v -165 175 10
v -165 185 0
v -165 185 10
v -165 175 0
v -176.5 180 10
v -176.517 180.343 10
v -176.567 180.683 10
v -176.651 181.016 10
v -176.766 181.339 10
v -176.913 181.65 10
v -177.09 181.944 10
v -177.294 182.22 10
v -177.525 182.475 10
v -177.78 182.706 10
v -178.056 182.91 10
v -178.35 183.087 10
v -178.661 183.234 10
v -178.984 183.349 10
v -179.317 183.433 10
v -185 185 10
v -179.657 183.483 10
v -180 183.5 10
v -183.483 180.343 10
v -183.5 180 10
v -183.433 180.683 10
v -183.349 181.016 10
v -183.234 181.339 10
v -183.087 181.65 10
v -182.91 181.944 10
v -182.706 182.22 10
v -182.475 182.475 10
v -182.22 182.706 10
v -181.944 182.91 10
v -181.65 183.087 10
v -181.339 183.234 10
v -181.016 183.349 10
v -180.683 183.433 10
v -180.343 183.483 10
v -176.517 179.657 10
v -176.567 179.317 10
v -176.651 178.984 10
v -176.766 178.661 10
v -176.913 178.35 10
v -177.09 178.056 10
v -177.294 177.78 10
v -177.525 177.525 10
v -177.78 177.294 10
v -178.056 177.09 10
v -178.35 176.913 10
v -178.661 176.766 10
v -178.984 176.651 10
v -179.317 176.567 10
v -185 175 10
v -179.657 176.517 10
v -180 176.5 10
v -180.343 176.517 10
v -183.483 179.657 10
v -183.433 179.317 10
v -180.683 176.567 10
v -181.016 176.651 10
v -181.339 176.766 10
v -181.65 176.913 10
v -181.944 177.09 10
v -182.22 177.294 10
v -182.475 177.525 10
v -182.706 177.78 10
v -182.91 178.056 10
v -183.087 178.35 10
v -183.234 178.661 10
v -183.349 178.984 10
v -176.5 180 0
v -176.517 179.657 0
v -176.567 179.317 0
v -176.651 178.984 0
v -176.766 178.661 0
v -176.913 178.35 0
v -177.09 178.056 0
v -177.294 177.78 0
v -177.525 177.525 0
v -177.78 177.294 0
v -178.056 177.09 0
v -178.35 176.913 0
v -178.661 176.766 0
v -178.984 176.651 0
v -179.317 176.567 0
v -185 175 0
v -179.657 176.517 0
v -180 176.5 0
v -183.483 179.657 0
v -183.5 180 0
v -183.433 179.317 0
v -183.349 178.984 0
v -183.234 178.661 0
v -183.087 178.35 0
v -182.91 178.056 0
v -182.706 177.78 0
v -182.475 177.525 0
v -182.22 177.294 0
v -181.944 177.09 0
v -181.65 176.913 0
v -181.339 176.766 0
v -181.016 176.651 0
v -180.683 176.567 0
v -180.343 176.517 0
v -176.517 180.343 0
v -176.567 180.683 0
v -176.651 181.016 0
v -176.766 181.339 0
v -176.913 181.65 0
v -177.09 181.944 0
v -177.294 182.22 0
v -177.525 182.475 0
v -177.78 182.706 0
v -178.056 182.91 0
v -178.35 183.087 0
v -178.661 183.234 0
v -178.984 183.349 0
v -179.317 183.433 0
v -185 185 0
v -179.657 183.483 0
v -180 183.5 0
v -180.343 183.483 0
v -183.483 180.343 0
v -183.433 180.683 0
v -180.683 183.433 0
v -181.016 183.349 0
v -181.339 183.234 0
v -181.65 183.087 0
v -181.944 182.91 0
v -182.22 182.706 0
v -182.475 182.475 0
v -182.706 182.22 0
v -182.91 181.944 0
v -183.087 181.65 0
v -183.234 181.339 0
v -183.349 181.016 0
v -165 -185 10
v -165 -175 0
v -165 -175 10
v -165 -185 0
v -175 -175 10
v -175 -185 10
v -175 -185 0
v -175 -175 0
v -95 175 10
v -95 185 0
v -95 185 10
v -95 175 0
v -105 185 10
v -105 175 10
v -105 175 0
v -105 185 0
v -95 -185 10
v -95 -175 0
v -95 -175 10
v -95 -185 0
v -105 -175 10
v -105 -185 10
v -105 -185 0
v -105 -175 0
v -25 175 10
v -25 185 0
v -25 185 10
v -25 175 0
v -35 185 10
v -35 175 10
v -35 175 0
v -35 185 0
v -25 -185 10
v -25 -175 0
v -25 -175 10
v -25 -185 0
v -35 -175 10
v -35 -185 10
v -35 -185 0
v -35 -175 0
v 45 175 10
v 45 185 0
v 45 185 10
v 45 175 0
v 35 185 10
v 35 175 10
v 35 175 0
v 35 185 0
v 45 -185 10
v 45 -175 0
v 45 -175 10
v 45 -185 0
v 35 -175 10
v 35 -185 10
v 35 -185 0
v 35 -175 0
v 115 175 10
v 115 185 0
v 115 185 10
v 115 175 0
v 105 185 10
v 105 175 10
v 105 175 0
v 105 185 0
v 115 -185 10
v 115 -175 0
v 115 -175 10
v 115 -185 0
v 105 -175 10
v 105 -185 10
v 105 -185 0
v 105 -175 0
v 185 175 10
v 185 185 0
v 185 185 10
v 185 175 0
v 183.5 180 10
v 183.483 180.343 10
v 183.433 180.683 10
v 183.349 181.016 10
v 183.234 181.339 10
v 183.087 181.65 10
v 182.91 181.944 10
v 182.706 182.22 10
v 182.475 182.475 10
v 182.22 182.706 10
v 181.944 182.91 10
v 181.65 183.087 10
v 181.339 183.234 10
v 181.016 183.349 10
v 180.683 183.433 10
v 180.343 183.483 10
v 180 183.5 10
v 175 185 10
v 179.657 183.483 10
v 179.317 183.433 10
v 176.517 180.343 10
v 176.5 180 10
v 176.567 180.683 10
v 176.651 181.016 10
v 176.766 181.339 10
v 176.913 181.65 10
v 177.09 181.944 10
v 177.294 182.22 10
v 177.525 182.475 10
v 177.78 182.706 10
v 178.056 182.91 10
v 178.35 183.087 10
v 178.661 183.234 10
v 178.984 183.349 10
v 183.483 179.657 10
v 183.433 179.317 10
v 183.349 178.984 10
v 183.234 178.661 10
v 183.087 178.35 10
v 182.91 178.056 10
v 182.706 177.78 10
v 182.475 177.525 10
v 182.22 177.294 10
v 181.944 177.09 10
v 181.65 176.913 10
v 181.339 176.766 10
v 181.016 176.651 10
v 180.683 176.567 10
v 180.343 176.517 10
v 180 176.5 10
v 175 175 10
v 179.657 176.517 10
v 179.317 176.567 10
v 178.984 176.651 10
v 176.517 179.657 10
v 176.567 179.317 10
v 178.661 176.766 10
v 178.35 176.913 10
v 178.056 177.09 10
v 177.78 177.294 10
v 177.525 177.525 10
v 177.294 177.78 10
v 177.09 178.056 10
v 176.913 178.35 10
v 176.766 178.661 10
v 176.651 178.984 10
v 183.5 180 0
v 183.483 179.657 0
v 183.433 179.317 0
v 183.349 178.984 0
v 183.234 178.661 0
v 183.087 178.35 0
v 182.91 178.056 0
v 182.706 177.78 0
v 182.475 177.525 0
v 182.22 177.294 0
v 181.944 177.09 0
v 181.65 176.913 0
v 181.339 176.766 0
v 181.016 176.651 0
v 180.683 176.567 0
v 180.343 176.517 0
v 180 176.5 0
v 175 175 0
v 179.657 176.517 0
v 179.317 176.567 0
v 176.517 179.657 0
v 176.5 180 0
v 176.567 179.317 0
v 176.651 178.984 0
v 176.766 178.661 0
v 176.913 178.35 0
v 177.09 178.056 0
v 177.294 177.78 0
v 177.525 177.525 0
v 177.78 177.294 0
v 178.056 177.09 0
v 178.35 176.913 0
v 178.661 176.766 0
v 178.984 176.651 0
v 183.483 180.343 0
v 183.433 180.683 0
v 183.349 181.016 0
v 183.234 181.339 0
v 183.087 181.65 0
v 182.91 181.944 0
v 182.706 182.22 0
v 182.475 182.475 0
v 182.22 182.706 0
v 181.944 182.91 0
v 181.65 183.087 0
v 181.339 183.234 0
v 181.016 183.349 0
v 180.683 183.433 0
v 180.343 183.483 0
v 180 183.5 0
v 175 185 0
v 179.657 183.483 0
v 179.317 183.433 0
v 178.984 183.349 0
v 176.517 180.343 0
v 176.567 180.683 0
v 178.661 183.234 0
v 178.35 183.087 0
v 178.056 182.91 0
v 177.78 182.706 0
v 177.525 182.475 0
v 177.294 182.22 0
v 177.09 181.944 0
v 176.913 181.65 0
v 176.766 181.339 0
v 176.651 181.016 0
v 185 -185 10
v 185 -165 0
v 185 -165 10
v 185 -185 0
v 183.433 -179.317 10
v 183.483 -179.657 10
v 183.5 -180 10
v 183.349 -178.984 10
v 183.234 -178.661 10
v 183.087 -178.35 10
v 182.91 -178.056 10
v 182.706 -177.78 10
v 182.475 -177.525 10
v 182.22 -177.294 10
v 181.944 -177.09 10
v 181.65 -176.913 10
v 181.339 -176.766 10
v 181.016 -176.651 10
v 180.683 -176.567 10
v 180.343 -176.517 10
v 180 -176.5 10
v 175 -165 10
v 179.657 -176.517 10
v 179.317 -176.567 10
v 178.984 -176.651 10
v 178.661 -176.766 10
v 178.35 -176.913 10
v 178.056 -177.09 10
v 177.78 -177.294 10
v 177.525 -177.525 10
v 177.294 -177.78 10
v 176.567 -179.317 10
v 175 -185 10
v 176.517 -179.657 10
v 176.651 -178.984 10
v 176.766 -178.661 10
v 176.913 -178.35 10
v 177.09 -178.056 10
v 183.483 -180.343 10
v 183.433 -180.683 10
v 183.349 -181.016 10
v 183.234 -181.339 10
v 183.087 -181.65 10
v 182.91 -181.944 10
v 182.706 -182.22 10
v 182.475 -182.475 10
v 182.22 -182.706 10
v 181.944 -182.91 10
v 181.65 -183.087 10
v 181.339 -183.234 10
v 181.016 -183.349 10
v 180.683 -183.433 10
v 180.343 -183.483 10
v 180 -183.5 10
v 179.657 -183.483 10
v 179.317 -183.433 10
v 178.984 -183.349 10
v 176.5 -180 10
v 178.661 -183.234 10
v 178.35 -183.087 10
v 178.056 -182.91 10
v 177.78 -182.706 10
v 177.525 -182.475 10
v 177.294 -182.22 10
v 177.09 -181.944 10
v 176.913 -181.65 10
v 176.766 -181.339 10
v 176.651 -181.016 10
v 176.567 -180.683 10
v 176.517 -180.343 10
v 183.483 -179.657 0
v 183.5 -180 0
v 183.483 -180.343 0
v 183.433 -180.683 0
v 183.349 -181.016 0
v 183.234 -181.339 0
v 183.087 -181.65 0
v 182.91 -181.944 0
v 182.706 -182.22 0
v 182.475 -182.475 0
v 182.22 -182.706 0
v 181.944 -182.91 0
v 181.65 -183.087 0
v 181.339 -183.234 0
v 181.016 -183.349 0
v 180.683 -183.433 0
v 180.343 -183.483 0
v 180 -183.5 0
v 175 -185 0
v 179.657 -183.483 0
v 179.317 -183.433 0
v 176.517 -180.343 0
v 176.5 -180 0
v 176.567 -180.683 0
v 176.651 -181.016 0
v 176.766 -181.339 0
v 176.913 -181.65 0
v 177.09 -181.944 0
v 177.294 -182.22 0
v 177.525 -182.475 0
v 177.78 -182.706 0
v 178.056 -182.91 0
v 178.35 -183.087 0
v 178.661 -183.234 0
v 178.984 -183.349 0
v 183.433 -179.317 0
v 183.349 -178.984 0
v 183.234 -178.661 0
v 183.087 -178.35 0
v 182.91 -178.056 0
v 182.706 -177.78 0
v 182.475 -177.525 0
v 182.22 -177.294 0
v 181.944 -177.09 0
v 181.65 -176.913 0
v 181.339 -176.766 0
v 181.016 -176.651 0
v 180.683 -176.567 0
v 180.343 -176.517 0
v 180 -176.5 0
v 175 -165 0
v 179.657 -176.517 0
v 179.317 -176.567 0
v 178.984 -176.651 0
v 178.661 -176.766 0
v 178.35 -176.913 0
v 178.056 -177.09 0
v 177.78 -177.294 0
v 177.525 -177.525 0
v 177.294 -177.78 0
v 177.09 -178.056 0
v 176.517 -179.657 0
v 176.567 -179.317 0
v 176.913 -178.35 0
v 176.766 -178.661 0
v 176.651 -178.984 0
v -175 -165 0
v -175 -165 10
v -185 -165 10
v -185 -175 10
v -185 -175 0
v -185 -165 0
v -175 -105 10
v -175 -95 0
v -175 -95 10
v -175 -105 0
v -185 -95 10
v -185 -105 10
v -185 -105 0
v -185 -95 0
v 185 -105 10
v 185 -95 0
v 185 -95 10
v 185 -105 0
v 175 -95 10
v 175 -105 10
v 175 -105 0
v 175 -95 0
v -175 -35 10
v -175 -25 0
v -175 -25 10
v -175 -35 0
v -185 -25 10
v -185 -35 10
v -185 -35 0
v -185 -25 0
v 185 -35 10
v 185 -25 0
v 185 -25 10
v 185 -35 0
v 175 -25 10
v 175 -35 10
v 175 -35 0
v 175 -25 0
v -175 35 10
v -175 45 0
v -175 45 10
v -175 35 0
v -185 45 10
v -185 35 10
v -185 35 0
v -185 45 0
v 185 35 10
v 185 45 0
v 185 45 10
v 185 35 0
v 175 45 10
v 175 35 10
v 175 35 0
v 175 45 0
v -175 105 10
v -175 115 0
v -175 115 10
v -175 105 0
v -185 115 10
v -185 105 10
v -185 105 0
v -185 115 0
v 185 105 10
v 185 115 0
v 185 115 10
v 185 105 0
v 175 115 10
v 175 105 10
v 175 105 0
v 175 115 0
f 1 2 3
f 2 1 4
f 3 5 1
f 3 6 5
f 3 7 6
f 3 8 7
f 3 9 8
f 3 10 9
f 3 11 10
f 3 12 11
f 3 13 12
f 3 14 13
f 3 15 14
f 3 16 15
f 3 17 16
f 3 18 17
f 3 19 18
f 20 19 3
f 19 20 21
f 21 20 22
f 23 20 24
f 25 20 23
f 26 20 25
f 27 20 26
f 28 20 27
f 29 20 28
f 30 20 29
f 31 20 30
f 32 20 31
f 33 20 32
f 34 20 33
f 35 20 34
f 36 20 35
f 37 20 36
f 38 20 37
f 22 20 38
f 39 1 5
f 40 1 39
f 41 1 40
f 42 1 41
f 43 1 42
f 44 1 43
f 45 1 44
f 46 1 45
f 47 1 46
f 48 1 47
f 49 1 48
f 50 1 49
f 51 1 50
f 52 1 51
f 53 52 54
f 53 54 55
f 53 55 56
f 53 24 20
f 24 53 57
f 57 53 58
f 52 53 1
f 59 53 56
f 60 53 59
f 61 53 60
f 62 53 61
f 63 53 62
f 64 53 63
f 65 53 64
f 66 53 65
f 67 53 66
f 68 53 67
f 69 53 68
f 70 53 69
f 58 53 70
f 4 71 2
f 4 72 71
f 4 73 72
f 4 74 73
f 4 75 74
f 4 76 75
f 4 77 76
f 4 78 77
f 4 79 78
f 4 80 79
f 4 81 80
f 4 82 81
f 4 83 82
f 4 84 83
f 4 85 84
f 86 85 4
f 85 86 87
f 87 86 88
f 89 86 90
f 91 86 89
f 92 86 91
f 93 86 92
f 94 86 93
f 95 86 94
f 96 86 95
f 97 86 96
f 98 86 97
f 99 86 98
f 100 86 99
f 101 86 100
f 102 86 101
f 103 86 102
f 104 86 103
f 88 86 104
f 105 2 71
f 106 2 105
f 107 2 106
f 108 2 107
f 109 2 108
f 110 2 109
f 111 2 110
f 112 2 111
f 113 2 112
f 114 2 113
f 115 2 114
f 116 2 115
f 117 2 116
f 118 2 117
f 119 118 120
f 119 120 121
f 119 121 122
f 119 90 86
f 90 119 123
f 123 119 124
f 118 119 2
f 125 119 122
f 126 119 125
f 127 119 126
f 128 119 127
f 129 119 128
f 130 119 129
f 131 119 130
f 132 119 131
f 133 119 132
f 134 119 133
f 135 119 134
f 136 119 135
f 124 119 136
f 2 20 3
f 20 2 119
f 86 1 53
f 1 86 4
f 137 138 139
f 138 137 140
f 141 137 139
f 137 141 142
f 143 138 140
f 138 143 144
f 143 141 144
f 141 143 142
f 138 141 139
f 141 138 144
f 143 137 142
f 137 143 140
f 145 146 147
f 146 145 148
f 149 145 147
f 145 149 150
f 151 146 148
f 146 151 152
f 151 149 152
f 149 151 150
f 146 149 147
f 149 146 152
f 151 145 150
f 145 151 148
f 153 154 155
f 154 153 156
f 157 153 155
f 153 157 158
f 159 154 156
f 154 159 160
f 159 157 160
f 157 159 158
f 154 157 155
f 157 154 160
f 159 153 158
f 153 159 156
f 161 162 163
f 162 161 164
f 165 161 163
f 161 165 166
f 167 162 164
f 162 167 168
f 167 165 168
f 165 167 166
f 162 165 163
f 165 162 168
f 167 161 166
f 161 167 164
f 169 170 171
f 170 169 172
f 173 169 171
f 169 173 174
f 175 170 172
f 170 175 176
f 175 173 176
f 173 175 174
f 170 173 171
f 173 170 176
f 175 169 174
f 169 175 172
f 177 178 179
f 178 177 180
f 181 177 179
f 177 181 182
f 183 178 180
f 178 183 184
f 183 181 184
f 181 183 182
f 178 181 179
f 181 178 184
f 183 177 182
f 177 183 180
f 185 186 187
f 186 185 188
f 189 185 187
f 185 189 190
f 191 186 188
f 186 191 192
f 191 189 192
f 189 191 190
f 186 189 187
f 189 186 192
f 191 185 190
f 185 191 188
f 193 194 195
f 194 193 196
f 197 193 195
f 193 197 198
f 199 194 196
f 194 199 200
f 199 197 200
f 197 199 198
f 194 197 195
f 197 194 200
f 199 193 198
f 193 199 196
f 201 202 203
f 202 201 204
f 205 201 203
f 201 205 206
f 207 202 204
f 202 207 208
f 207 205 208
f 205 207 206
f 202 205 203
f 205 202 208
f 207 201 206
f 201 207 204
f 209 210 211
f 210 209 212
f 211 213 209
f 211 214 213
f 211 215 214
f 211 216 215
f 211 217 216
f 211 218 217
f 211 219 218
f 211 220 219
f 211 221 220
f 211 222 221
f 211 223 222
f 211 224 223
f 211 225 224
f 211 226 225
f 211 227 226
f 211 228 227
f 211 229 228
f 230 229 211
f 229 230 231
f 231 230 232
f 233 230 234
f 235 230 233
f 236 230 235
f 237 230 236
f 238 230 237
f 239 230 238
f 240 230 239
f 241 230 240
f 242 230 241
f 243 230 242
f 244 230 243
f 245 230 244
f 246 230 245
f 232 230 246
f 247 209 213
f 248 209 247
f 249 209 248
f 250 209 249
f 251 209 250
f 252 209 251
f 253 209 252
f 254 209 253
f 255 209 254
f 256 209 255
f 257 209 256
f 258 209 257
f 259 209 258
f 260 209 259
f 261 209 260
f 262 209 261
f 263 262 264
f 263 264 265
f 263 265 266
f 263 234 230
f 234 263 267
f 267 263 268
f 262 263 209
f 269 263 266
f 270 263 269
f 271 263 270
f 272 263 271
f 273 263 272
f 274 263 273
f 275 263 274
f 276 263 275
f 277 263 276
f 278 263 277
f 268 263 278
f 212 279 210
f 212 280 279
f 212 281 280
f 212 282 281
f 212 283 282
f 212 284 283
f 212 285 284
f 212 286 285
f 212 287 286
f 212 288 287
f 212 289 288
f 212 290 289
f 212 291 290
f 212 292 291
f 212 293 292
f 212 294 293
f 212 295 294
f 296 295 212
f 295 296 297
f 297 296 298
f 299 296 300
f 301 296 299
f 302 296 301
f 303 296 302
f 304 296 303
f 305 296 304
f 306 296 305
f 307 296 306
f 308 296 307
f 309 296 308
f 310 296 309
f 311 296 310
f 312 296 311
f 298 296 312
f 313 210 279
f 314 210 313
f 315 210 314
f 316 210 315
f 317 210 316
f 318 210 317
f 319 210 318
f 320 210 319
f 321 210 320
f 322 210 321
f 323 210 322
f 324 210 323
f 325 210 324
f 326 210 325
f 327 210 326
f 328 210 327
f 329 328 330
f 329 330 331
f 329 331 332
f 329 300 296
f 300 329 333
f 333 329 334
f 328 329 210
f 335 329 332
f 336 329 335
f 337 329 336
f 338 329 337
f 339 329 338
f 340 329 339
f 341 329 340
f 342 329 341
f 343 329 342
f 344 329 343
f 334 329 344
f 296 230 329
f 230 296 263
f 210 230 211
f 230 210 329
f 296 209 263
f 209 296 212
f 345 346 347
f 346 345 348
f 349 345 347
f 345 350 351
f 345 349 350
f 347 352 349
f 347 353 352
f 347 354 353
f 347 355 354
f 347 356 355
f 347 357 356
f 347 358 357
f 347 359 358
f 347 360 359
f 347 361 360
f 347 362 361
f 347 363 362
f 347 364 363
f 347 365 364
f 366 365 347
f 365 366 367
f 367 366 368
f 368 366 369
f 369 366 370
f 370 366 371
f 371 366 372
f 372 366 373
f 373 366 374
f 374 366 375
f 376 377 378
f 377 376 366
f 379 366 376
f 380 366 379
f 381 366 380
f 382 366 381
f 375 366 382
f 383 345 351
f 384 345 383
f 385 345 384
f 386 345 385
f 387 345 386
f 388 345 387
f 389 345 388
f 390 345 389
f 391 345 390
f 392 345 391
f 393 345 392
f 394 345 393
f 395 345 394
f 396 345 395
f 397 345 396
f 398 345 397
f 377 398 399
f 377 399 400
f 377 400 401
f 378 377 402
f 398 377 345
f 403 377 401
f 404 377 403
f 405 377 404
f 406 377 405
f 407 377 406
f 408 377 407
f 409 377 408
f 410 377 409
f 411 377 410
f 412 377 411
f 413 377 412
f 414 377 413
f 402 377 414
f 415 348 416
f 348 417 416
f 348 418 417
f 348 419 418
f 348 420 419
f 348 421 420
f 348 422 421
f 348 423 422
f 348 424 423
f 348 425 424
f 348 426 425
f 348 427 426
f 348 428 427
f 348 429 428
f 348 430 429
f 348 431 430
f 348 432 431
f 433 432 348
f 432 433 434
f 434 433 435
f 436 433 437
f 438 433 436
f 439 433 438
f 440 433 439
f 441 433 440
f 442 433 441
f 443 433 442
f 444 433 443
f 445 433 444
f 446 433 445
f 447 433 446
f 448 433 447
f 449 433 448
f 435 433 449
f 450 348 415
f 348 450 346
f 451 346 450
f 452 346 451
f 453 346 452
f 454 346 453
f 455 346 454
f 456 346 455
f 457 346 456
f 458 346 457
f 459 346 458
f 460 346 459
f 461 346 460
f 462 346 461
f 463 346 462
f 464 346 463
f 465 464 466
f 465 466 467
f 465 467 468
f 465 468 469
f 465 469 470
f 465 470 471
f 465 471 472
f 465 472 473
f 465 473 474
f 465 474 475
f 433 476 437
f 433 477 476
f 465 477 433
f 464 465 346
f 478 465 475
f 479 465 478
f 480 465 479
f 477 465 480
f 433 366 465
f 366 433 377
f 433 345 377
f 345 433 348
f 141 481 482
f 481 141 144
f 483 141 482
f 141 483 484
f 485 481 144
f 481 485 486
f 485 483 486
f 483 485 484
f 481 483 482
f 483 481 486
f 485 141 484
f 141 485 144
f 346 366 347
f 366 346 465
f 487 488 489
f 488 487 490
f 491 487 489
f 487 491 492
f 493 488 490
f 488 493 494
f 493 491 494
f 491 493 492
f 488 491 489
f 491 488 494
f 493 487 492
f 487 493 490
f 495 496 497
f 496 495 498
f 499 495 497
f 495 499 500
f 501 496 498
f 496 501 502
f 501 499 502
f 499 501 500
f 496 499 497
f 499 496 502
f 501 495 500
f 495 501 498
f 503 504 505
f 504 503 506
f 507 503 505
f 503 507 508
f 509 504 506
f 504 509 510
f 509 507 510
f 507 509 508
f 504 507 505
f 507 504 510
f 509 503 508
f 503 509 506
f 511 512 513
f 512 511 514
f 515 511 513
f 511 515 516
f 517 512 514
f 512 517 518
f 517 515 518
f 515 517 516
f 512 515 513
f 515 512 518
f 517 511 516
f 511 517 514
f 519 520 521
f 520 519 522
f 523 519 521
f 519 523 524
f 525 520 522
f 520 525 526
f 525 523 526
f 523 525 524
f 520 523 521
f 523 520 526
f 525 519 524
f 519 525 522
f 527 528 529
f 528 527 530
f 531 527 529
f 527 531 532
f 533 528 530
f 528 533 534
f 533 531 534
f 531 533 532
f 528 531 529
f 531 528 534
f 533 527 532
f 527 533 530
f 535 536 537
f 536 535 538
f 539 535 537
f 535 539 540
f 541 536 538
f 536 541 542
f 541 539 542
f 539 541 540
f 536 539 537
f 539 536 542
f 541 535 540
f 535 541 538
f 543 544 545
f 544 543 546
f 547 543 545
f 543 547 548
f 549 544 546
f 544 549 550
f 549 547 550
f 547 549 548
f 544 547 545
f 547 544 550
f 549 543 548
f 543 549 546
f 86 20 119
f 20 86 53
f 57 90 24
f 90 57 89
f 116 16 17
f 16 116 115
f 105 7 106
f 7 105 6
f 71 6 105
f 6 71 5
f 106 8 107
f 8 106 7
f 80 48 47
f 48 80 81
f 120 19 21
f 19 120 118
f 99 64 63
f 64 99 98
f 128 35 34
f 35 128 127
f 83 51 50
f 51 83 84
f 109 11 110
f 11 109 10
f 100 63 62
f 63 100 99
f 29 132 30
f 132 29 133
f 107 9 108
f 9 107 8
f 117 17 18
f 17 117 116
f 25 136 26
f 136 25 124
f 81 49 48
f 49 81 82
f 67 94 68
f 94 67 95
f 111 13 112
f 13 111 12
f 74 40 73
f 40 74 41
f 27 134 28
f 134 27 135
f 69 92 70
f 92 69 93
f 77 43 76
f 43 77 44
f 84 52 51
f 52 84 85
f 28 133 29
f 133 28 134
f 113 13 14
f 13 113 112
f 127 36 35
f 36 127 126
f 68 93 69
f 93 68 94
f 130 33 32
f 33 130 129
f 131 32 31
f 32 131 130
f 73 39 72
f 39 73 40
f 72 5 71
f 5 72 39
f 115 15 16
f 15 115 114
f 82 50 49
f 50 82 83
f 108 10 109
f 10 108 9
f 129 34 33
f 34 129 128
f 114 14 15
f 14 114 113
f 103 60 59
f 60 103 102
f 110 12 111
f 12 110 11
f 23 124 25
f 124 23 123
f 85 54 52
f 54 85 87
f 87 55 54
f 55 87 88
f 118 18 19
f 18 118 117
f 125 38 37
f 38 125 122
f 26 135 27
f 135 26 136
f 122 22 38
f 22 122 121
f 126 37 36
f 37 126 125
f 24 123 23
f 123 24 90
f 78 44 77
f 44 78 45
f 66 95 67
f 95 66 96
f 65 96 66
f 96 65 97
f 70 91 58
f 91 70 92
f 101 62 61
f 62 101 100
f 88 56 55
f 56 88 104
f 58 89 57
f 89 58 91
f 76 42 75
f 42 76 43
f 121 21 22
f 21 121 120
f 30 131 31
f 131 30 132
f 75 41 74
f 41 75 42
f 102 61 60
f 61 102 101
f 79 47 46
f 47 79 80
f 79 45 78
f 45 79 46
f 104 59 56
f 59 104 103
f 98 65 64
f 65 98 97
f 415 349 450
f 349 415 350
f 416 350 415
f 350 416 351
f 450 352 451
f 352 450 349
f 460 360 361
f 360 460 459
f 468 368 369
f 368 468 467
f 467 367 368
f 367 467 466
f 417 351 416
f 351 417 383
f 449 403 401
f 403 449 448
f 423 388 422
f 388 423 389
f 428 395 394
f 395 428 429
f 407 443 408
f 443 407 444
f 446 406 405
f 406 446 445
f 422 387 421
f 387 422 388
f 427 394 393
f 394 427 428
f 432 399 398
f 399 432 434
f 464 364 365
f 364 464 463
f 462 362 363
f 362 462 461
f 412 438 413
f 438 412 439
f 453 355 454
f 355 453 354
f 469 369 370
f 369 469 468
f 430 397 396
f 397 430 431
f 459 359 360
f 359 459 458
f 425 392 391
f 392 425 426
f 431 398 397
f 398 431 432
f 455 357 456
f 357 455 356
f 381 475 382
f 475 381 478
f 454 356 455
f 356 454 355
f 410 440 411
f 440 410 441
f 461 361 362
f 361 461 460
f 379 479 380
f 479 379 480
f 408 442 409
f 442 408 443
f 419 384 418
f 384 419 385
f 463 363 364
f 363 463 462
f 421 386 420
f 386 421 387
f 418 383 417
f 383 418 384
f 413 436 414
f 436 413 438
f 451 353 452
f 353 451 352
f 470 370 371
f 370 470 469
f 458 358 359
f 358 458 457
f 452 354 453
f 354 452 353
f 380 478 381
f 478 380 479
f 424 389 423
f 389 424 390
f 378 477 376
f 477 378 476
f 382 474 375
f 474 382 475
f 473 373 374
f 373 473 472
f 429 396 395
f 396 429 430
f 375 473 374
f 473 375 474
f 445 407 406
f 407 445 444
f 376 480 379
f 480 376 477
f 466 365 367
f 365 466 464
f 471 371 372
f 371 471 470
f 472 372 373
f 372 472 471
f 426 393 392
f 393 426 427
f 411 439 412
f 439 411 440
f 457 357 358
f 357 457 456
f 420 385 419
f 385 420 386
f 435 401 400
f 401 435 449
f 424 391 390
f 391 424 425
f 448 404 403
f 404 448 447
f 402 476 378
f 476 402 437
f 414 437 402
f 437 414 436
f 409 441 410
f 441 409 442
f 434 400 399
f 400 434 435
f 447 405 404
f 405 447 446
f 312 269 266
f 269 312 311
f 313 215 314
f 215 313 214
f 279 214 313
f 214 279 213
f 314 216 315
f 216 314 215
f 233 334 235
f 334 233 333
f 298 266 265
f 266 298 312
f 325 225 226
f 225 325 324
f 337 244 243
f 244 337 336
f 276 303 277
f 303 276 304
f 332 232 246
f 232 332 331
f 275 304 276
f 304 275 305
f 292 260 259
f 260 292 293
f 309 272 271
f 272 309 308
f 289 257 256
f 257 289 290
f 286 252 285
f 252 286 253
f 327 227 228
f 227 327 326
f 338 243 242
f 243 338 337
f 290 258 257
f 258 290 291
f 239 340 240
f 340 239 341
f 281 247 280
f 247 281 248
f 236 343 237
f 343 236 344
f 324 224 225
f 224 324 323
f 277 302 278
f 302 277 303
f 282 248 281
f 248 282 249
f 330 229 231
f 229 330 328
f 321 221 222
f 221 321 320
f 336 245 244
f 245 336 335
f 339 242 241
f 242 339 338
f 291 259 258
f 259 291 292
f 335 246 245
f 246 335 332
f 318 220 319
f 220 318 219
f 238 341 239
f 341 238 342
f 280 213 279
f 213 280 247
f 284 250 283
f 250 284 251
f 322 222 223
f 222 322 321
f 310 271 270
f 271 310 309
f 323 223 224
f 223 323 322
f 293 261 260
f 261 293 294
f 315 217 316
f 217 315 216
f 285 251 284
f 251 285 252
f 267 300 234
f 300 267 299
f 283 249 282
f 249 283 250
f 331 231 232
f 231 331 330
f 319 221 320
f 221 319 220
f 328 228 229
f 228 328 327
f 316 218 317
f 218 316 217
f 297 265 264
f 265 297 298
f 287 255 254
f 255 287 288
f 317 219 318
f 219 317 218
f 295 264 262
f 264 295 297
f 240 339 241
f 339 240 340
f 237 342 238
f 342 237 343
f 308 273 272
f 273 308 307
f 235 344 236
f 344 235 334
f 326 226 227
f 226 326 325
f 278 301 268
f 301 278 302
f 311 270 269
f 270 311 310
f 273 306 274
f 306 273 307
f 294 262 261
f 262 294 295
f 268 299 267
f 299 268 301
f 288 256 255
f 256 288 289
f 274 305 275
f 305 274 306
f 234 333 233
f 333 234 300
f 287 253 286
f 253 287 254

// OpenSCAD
// ring_54.scad - ring index 54 (z bottom = 540 mm)
$fn = 64; bar = 10; half_b = bar/2; outer = 370; half_outer = outer/2;
front_y = 180; back_y = -180; left_x = -180; right_x = 180;
x_centers = [-170, -100, -30, 40, 110, 180];
z_centers = [5, 85, 155, 225, 295, 365, 435, 505, 575, 645, 715]; ring_z = 540;
module place_box(cx, cy, sx, sy) { translate([cx - sx/2, cy - sy/2, 0]) cube([sx, sy, bar]); }

difference() { union() {
    for (x = x_centers) { place_box(x, front_y, bar, bar); place_box(x, back_y, bar, bar); }
    for (y = x_centers) { place_box(left_x, y, bar, bar); place_box(right_x, y, bar, bar); }
    for (zc = z_centers) if ((zc - half_b < ring_z + bar) && (zc + half_b > ring_z)) {
        translate([-half_outer, front_y - half_b, 0]) cube([outer, bar, bar]);
        translate([-half_outer, back_y - half_b, 0])  cube([outer, bar, bar]);
        translate([left_x - half_b, -half_outer, 0])  cube([bar, outer, bar]);
        translate([right_x - half_b, -half_outer, 0]) cube([bar, outer, bar]);
    }
  }
  for (cx = [-180, 180]) for (cy = [-180, 180]) translate([cx, cy, 0]) cylinder(h = bar, r = 3.5, $fn = 64);
}
